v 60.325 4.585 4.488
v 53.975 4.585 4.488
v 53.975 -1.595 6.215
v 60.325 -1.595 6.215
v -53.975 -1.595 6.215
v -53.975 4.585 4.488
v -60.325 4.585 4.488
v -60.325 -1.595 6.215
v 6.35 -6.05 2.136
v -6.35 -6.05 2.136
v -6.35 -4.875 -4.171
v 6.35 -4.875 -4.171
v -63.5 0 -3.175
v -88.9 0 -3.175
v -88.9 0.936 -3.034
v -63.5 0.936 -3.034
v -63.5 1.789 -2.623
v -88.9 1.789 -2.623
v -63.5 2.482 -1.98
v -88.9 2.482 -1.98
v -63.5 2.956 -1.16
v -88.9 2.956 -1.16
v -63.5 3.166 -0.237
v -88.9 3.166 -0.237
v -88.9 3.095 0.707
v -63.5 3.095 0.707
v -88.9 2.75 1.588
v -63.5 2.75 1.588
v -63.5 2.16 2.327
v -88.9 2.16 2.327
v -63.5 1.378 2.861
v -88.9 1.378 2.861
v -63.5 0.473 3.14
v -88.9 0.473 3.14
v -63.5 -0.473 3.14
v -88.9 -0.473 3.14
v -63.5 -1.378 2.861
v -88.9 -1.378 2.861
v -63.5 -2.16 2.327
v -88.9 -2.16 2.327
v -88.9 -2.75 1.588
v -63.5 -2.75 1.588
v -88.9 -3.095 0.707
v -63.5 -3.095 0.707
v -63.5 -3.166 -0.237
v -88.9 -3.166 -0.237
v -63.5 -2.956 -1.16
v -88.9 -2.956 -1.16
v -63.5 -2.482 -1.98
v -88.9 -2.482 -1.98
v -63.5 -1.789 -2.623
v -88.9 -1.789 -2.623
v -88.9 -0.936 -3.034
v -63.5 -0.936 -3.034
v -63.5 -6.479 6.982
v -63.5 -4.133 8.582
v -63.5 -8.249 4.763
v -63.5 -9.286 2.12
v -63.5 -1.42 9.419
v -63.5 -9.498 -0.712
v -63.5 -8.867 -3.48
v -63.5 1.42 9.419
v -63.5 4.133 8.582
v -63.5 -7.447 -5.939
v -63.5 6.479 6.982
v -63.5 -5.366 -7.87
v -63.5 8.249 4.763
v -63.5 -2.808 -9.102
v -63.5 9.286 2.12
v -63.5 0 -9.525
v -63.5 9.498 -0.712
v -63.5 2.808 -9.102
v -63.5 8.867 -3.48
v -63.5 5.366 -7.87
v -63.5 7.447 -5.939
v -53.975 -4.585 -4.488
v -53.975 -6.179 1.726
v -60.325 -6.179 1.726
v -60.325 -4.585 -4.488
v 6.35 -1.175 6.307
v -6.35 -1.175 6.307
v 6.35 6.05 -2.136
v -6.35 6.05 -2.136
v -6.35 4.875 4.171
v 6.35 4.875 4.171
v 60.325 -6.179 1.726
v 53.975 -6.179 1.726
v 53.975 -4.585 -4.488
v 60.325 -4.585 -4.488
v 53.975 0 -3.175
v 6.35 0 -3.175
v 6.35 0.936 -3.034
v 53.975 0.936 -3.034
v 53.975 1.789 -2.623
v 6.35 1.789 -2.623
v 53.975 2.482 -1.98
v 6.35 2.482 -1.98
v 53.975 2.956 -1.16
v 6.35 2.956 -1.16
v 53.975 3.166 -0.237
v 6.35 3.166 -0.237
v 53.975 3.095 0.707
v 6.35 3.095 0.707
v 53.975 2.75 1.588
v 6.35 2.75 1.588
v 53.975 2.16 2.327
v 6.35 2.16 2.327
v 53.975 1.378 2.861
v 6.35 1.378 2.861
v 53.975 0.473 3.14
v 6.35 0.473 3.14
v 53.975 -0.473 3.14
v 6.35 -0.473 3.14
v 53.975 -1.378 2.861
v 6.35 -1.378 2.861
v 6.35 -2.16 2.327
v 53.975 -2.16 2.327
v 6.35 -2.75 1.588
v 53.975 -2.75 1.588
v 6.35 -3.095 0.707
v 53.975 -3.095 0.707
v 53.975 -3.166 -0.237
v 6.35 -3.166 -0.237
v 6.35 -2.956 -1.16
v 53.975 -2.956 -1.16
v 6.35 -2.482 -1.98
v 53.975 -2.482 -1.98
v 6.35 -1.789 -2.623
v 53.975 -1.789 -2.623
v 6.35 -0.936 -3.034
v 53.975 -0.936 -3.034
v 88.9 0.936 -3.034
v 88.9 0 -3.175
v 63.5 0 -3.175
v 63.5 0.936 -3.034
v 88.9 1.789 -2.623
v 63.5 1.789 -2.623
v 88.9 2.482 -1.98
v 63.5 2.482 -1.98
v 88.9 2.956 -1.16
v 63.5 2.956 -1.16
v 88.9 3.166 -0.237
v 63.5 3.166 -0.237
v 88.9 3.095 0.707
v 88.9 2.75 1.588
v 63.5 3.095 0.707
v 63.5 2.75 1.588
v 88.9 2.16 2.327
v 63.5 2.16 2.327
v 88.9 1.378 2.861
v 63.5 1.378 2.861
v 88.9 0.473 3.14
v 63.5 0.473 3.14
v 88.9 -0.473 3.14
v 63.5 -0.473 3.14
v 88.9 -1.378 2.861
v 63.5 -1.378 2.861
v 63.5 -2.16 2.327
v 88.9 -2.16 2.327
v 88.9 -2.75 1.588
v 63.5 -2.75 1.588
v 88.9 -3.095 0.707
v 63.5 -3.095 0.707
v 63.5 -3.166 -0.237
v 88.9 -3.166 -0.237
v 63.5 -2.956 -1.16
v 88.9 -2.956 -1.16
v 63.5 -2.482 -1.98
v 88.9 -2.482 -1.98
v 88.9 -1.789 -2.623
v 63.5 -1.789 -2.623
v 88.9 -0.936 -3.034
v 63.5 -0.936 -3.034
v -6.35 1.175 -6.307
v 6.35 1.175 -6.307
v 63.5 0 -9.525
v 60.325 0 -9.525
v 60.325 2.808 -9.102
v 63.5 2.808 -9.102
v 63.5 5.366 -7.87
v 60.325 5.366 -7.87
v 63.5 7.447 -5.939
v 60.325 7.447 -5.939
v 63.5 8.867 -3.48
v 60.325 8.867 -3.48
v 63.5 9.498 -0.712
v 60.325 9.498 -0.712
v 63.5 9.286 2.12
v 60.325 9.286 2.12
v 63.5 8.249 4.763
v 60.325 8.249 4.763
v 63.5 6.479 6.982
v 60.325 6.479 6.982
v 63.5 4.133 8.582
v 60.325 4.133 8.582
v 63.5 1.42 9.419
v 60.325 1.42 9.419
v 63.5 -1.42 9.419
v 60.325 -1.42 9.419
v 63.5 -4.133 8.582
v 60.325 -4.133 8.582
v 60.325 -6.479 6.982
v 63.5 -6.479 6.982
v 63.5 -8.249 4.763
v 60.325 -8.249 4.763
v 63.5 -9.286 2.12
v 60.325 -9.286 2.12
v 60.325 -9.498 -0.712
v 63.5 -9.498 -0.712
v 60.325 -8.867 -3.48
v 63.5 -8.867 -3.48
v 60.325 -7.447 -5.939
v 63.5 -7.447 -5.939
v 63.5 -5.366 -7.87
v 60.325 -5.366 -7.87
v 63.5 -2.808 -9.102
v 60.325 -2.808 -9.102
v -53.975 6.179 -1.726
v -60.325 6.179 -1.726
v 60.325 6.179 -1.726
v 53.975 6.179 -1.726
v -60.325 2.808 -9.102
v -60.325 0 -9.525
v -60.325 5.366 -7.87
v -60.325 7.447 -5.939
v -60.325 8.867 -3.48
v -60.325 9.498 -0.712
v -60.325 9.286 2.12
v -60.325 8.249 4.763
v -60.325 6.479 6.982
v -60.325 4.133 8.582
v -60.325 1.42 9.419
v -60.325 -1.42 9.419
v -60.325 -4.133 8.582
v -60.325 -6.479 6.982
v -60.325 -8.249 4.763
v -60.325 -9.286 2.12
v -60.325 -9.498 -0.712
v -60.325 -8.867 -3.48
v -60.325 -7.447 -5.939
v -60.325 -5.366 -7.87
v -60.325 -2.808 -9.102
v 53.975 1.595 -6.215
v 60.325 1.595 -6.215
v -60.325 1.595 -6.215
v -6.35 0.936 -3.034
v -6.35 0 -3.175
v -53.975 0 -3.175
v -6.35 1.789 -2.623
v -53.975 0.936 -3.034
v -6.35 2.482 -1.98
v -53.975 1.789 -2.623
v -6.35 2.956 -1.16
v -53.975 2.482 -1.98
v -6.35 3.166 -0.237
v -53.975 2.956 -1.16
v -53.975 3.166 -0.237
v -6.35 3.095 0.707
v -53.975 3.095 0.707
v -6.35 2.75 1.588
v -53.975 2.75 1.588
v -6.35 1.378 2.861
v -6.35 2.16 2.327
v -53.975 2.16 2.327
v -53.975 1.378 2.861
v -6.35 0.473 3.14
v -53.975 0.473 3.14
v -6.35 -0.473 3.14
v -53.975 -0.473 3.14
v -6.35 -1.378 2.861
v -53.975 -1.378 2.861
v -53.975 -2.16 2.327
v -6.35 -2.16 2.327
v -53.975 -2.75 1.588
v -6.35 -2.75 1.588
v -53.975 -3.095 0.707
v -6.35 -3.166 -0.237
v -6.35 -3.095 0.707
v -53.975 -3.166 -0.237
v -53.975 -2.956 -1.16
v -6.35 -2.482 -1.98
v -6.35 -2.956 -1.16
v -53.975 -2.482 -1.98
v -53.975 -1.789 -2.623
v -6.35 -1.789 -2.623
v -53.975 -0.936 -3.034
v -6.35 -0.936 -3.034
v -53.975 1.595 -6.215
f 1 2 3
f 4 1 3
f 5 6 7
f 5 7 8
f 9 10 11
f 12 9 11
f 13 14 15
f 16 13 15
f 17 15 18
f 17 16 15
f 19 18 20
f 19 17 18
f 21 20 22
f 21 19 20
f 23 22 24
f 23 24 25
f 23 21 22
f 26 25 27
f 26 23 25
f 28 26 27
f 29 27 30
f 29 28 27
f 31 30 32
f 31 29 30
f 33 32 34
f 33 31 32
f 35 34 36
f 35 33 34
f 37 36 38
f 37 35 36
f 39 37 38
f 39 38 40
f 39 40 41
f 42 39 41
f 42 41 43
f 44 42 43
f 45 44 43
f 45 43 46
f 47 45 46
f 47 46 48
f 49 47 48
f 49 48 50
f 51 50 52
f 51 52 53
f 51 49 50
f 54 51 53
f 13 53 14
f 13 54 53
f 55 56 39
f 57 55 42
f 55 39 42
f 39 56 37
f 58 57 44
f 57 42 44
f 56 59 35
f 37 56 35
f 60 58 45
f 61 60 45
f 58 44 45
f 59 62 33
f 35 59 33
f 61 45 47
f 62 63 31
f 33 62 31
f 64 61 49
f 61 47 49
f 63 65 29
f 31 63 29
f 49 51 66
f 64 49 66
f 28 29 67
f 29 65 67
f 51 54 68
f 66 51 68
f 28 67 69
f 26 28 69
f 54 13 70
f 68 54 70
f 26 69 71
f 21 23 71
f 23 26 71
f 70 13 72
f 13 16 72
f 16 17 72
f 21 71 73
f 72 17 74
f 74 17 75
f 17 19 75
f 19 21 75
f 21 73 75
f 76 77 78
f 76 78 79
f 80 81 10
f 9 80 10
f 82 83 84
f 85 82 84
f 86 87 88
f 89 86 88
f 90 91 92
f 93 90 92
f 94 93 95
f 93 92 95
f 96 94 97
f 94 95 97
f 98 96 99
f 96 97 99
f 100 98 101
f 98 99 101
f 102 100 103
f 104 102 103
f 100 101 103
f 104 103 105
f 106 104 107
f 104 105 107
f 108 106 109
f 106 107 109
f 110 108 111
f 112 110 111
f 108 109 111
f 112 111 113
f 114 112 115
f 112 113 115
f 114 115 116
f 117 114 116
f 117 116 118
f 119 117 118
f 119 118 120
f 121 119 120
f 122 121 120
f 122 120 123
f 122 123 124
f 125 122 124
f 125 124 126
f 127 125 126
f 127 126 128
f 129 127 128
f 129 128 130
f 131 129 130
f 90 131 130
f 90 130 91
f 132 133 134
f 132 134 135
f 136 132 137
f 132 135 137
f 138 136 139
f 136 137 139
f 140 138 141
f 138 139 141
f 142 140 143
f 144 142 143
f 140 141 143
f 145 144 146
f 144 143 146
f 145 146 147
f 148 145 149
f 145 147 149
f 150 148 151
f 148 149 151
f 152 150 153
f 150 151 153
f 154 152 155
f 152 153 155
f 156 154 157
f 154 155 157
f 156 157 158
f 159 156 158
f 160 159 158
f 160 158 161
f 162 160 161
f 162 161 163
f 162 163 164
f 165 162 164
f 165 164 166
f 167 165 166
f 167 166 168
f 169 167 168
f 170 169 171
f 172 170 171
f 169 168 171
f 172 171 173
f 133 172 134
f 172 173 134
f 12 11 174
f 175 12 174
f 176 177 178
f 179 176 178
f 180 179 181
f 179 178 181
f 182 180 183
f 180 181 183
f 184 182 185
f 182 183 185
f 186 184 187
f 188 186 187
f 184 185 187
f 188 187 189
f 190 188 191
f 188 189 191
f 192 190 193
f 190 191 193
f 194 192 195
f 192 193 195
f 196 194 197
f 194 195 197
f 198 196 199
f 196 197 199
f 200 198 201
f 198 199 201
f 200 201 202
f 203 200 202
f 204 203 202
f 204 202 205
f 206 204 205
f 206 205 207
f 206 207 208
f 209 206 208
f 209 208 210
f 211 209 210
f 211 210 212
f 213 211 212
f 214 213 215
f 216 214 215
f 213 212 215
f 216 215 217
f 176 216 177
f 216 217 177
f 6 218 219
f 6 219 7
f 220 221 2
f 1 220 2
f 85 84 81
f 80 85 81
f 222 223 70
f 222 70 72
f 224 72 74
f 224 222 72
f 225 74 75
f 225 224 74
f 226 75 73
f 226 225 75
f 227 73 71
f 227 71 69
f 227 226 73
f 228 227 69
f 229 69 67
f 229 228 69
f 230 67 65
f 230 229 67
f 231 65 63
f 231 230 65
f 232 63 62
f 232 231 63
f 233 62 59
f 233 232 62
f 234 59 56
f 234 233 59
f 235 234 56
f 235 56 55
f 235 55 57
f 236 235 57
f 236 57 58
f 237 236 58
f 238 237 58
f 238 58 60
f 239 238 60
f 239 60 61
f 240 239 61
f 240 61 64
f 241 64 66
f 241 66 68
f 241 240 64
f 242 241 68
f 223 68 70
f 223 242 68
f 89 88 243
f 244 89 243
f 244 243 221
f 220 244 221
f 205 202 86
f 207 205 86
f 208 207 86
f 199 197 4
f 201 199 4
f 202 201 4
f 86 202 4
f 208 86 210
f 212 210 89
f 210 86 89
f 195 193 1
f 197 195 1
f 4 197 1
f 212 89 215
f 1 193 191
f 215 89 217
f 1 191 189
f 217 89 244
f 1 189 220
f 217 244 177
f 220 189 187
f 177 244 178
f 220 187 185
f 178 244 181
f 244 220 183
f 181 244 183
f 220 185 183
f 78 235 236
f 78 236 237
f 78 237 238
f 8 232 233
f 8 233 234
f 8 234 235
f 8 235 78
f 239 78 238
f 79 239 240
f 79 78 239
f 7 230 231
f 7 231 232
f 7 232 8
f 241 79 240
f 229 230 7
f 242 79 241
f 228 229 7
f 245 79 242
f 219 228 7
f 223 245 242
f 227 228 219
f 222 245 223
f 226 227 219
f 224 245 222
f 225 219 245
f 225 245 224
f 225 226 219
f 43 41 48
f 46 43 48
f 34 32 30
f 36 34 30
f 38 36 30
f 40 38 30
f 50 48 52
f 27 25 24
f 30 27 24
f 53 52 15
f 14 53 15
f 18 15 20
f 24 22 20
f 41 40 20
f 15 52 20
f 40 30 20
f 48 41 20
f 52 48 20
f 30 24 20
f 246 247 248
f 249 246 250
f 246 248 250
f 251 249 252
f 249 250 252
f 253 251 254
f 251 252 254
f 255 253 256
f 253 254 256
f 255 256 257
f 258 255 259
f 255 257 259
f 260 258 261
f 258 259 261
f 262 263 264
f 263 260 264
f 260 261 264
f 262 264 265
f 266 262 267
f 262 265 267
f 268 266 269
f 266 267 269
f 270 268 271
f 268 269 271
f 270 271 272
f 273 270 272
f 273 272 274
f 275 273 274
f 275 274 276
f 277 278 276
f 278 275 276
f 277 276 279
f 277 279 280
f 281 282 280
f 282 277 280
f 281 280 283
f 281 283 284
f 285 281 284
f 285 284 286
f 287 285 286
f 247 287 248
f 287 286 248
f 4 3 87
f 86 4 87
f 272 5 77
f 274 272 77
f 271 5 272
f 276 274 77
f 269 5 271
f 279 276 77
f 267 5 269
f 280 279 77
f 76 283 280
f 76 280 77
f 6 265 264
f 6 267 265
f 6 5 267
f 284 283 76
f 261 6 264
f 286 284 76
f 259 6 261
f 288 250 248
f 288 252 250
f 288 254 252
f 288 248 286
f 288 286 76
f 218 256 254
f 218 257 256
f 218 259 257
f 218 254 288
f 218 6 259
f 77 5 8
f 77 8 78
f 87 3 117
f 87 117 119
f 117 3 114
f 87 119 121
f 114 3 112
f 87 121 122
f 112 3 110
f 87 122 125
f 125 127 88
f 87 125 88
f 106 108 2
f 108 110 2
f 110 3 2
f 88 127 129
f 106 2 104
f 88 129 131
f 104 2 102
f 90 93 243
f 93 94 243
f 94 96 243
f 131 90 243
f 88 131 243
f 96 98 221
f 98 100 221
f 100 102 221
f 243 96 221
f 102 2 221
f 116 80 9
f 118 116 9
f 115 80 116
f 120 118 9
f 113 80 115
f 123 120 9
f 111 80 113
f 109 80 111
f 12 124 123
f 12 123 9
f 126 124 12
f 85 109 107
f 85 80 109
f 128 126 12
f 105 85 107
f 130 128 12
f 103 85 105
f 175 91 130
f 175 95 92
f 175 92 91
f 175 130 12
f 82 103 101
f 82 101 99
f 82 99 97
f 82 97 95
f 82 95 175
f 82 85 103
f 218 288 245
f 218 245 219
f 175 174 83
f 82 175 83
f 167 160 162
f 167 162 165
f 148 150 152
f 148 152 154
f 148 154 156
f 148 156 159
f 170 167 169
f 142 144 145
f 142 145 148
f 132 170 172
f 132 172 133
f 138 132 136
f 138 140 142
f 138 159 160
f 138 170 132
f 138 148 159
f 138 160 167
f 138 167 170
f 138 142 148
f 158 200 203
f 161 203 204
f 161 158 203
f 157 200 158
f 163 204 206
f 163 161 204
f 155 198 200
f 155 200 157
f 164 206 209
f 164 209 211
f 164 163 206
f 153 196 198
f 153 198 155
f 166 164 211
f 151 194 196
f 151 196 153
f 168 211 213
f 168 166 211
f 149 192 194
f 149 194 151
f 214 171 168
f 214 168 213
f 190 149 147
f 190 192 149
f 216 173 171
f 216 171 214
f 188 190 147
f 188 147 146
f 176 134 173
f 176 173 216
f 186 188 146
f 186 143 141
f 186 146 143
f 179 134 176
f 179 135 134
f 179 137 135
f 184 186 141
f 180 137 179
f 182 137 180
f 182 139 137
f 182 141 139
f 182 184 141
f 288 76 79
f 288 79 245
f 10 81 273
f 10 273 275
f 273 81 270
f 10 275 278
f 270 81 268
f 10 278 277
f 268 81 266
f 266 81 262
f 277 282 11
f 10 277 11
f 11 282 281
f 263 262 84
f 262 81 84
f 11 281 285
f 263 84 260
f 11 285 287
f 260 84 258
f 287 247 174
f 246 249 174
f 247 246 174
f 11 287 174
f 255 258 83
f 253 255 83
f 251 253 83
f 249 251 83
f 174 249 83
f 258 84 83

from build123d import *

# Parameters (mm, degrees)
BOSS_EXTRUDE1_DEPTH      = 6.35
BOSS_EXTRUDE1_DEPTH_BACK = 6.35
BOSS_EXTRUDE2_DEPTH      = 47.625
BOSS_EXTRUDE2_DEPTH_BACK = 60.325
SKETCH3_R                = 3.175
BOSS_EXTRUDE3_DEPTH      = 6.35
SKETCH5_R                = 9.525
BOSS_EXTRUDE4_DEPTH      = 3.175
SKETCH7_R                = 3.175
BOSS_EXTRUDE5_DEPTH      = 25.4


with BuildPart() as part:
    # Sketch2 → Boss-Extrude1 (new, two sides: drawn at the far end of the back side and taken through both)
    with BuildSketch(Plane(origin=(0, 0, 0), x_dir=(0, 0, -1), z_dir=(1, 0, 0)).offset(-BOSS_EXTRUDE1_DEPTH_BACK)):
        Polygon((4.171210262, -4.874787896), (6.307295287, 1.174980103), (2.136085025, 6.049767999), (-4.171210262, 4.874787896), (-6.307295287, -1.174980103), (-2.136085025, -6.049767999), align=None)
    extrude(amount=BOSS_EXTRUDE1_DEPTH + BOSS_EXTRUDE1_DEPTH_BACK)

    # Sketch3 → Boss-Extrude2 (add, two sides: drawn at the far end of the back side and taken through both)
    with BuildSketch(Plane(origin=(6.35, 0, 0), x_dir=(0, 0, -1), z_dir=(1, 0, 0)).offset(-BOSS_EXTRUDE2_DEPTH_BACK)):
        Circle(SKETCH3_R)
    extrude(amount=BOSS_EXTRUDE2_DEPTH + BOSS_EXTRUDE2_DEPTH_BACK)

    # Sketch4 → Boss-Extrude3 (add)
    with BuildSketch(Plane(origin=(53.975, 0, 0), x_dir=(0, 0, -1), z_dir=(1, 0, 0))):
        Polygon((4.488142835, -4.584662035), (6.214505208, 1.594514693), (1.726362373, 6.179176728), (-4.488142835, 4.584662035), (-6.214505208, -1.594514693), (-1.726362373, -6.179176728), align=None)
    boss_extrude3 = extrude(amount=BOSS_EXTRUDE3_DEPTH)

    # Sketch5 → Boss-Extrude4 (add)
    with BuildSketch(Plane(origin=(60.325, 0, 0), x_dir=(0, 0, -1), z_dir=(1, 0, 0))):
        Circle(SKETCH5_R)
    boss_extrude4 = extrude(amount=BOSS_EXTRUDE4_DEPTH)

    # Mirror1: Boss-Extrude3, Boss-Extrude4 across plane
    add(boss_extrude3.mirror(Plane(origin=(0, 0, 0), x_dir=(0, 0, 1), z_dir=(1, 0, 0))))
    add(boss_extrude4.mirror(Plane(origin=(0, 0, 0), x_dir=(0, 0, 1), z_dir=(1, 0, 0))))

    # Sketch7 → Boss-Extrude5 (add)
    with BuildSketch(Plane(origin=(63.5, 0, 0), x_dir=(0, 0, -1), z_dir=(1, 0, 0))):
        Circle(SKETCH7_R)
    boss_extrude5 = extrude(amount=BOSS_EXTRUDE5_DEPTH)

    # Mirror3: Boss-Extrude5 across plane
    add(boss_extrude5.mirror(Plane(origin=(0, 0, 0), x_dir=(0, 0, 1), z_dir=(1, 0, 0))))


solid = part.part
